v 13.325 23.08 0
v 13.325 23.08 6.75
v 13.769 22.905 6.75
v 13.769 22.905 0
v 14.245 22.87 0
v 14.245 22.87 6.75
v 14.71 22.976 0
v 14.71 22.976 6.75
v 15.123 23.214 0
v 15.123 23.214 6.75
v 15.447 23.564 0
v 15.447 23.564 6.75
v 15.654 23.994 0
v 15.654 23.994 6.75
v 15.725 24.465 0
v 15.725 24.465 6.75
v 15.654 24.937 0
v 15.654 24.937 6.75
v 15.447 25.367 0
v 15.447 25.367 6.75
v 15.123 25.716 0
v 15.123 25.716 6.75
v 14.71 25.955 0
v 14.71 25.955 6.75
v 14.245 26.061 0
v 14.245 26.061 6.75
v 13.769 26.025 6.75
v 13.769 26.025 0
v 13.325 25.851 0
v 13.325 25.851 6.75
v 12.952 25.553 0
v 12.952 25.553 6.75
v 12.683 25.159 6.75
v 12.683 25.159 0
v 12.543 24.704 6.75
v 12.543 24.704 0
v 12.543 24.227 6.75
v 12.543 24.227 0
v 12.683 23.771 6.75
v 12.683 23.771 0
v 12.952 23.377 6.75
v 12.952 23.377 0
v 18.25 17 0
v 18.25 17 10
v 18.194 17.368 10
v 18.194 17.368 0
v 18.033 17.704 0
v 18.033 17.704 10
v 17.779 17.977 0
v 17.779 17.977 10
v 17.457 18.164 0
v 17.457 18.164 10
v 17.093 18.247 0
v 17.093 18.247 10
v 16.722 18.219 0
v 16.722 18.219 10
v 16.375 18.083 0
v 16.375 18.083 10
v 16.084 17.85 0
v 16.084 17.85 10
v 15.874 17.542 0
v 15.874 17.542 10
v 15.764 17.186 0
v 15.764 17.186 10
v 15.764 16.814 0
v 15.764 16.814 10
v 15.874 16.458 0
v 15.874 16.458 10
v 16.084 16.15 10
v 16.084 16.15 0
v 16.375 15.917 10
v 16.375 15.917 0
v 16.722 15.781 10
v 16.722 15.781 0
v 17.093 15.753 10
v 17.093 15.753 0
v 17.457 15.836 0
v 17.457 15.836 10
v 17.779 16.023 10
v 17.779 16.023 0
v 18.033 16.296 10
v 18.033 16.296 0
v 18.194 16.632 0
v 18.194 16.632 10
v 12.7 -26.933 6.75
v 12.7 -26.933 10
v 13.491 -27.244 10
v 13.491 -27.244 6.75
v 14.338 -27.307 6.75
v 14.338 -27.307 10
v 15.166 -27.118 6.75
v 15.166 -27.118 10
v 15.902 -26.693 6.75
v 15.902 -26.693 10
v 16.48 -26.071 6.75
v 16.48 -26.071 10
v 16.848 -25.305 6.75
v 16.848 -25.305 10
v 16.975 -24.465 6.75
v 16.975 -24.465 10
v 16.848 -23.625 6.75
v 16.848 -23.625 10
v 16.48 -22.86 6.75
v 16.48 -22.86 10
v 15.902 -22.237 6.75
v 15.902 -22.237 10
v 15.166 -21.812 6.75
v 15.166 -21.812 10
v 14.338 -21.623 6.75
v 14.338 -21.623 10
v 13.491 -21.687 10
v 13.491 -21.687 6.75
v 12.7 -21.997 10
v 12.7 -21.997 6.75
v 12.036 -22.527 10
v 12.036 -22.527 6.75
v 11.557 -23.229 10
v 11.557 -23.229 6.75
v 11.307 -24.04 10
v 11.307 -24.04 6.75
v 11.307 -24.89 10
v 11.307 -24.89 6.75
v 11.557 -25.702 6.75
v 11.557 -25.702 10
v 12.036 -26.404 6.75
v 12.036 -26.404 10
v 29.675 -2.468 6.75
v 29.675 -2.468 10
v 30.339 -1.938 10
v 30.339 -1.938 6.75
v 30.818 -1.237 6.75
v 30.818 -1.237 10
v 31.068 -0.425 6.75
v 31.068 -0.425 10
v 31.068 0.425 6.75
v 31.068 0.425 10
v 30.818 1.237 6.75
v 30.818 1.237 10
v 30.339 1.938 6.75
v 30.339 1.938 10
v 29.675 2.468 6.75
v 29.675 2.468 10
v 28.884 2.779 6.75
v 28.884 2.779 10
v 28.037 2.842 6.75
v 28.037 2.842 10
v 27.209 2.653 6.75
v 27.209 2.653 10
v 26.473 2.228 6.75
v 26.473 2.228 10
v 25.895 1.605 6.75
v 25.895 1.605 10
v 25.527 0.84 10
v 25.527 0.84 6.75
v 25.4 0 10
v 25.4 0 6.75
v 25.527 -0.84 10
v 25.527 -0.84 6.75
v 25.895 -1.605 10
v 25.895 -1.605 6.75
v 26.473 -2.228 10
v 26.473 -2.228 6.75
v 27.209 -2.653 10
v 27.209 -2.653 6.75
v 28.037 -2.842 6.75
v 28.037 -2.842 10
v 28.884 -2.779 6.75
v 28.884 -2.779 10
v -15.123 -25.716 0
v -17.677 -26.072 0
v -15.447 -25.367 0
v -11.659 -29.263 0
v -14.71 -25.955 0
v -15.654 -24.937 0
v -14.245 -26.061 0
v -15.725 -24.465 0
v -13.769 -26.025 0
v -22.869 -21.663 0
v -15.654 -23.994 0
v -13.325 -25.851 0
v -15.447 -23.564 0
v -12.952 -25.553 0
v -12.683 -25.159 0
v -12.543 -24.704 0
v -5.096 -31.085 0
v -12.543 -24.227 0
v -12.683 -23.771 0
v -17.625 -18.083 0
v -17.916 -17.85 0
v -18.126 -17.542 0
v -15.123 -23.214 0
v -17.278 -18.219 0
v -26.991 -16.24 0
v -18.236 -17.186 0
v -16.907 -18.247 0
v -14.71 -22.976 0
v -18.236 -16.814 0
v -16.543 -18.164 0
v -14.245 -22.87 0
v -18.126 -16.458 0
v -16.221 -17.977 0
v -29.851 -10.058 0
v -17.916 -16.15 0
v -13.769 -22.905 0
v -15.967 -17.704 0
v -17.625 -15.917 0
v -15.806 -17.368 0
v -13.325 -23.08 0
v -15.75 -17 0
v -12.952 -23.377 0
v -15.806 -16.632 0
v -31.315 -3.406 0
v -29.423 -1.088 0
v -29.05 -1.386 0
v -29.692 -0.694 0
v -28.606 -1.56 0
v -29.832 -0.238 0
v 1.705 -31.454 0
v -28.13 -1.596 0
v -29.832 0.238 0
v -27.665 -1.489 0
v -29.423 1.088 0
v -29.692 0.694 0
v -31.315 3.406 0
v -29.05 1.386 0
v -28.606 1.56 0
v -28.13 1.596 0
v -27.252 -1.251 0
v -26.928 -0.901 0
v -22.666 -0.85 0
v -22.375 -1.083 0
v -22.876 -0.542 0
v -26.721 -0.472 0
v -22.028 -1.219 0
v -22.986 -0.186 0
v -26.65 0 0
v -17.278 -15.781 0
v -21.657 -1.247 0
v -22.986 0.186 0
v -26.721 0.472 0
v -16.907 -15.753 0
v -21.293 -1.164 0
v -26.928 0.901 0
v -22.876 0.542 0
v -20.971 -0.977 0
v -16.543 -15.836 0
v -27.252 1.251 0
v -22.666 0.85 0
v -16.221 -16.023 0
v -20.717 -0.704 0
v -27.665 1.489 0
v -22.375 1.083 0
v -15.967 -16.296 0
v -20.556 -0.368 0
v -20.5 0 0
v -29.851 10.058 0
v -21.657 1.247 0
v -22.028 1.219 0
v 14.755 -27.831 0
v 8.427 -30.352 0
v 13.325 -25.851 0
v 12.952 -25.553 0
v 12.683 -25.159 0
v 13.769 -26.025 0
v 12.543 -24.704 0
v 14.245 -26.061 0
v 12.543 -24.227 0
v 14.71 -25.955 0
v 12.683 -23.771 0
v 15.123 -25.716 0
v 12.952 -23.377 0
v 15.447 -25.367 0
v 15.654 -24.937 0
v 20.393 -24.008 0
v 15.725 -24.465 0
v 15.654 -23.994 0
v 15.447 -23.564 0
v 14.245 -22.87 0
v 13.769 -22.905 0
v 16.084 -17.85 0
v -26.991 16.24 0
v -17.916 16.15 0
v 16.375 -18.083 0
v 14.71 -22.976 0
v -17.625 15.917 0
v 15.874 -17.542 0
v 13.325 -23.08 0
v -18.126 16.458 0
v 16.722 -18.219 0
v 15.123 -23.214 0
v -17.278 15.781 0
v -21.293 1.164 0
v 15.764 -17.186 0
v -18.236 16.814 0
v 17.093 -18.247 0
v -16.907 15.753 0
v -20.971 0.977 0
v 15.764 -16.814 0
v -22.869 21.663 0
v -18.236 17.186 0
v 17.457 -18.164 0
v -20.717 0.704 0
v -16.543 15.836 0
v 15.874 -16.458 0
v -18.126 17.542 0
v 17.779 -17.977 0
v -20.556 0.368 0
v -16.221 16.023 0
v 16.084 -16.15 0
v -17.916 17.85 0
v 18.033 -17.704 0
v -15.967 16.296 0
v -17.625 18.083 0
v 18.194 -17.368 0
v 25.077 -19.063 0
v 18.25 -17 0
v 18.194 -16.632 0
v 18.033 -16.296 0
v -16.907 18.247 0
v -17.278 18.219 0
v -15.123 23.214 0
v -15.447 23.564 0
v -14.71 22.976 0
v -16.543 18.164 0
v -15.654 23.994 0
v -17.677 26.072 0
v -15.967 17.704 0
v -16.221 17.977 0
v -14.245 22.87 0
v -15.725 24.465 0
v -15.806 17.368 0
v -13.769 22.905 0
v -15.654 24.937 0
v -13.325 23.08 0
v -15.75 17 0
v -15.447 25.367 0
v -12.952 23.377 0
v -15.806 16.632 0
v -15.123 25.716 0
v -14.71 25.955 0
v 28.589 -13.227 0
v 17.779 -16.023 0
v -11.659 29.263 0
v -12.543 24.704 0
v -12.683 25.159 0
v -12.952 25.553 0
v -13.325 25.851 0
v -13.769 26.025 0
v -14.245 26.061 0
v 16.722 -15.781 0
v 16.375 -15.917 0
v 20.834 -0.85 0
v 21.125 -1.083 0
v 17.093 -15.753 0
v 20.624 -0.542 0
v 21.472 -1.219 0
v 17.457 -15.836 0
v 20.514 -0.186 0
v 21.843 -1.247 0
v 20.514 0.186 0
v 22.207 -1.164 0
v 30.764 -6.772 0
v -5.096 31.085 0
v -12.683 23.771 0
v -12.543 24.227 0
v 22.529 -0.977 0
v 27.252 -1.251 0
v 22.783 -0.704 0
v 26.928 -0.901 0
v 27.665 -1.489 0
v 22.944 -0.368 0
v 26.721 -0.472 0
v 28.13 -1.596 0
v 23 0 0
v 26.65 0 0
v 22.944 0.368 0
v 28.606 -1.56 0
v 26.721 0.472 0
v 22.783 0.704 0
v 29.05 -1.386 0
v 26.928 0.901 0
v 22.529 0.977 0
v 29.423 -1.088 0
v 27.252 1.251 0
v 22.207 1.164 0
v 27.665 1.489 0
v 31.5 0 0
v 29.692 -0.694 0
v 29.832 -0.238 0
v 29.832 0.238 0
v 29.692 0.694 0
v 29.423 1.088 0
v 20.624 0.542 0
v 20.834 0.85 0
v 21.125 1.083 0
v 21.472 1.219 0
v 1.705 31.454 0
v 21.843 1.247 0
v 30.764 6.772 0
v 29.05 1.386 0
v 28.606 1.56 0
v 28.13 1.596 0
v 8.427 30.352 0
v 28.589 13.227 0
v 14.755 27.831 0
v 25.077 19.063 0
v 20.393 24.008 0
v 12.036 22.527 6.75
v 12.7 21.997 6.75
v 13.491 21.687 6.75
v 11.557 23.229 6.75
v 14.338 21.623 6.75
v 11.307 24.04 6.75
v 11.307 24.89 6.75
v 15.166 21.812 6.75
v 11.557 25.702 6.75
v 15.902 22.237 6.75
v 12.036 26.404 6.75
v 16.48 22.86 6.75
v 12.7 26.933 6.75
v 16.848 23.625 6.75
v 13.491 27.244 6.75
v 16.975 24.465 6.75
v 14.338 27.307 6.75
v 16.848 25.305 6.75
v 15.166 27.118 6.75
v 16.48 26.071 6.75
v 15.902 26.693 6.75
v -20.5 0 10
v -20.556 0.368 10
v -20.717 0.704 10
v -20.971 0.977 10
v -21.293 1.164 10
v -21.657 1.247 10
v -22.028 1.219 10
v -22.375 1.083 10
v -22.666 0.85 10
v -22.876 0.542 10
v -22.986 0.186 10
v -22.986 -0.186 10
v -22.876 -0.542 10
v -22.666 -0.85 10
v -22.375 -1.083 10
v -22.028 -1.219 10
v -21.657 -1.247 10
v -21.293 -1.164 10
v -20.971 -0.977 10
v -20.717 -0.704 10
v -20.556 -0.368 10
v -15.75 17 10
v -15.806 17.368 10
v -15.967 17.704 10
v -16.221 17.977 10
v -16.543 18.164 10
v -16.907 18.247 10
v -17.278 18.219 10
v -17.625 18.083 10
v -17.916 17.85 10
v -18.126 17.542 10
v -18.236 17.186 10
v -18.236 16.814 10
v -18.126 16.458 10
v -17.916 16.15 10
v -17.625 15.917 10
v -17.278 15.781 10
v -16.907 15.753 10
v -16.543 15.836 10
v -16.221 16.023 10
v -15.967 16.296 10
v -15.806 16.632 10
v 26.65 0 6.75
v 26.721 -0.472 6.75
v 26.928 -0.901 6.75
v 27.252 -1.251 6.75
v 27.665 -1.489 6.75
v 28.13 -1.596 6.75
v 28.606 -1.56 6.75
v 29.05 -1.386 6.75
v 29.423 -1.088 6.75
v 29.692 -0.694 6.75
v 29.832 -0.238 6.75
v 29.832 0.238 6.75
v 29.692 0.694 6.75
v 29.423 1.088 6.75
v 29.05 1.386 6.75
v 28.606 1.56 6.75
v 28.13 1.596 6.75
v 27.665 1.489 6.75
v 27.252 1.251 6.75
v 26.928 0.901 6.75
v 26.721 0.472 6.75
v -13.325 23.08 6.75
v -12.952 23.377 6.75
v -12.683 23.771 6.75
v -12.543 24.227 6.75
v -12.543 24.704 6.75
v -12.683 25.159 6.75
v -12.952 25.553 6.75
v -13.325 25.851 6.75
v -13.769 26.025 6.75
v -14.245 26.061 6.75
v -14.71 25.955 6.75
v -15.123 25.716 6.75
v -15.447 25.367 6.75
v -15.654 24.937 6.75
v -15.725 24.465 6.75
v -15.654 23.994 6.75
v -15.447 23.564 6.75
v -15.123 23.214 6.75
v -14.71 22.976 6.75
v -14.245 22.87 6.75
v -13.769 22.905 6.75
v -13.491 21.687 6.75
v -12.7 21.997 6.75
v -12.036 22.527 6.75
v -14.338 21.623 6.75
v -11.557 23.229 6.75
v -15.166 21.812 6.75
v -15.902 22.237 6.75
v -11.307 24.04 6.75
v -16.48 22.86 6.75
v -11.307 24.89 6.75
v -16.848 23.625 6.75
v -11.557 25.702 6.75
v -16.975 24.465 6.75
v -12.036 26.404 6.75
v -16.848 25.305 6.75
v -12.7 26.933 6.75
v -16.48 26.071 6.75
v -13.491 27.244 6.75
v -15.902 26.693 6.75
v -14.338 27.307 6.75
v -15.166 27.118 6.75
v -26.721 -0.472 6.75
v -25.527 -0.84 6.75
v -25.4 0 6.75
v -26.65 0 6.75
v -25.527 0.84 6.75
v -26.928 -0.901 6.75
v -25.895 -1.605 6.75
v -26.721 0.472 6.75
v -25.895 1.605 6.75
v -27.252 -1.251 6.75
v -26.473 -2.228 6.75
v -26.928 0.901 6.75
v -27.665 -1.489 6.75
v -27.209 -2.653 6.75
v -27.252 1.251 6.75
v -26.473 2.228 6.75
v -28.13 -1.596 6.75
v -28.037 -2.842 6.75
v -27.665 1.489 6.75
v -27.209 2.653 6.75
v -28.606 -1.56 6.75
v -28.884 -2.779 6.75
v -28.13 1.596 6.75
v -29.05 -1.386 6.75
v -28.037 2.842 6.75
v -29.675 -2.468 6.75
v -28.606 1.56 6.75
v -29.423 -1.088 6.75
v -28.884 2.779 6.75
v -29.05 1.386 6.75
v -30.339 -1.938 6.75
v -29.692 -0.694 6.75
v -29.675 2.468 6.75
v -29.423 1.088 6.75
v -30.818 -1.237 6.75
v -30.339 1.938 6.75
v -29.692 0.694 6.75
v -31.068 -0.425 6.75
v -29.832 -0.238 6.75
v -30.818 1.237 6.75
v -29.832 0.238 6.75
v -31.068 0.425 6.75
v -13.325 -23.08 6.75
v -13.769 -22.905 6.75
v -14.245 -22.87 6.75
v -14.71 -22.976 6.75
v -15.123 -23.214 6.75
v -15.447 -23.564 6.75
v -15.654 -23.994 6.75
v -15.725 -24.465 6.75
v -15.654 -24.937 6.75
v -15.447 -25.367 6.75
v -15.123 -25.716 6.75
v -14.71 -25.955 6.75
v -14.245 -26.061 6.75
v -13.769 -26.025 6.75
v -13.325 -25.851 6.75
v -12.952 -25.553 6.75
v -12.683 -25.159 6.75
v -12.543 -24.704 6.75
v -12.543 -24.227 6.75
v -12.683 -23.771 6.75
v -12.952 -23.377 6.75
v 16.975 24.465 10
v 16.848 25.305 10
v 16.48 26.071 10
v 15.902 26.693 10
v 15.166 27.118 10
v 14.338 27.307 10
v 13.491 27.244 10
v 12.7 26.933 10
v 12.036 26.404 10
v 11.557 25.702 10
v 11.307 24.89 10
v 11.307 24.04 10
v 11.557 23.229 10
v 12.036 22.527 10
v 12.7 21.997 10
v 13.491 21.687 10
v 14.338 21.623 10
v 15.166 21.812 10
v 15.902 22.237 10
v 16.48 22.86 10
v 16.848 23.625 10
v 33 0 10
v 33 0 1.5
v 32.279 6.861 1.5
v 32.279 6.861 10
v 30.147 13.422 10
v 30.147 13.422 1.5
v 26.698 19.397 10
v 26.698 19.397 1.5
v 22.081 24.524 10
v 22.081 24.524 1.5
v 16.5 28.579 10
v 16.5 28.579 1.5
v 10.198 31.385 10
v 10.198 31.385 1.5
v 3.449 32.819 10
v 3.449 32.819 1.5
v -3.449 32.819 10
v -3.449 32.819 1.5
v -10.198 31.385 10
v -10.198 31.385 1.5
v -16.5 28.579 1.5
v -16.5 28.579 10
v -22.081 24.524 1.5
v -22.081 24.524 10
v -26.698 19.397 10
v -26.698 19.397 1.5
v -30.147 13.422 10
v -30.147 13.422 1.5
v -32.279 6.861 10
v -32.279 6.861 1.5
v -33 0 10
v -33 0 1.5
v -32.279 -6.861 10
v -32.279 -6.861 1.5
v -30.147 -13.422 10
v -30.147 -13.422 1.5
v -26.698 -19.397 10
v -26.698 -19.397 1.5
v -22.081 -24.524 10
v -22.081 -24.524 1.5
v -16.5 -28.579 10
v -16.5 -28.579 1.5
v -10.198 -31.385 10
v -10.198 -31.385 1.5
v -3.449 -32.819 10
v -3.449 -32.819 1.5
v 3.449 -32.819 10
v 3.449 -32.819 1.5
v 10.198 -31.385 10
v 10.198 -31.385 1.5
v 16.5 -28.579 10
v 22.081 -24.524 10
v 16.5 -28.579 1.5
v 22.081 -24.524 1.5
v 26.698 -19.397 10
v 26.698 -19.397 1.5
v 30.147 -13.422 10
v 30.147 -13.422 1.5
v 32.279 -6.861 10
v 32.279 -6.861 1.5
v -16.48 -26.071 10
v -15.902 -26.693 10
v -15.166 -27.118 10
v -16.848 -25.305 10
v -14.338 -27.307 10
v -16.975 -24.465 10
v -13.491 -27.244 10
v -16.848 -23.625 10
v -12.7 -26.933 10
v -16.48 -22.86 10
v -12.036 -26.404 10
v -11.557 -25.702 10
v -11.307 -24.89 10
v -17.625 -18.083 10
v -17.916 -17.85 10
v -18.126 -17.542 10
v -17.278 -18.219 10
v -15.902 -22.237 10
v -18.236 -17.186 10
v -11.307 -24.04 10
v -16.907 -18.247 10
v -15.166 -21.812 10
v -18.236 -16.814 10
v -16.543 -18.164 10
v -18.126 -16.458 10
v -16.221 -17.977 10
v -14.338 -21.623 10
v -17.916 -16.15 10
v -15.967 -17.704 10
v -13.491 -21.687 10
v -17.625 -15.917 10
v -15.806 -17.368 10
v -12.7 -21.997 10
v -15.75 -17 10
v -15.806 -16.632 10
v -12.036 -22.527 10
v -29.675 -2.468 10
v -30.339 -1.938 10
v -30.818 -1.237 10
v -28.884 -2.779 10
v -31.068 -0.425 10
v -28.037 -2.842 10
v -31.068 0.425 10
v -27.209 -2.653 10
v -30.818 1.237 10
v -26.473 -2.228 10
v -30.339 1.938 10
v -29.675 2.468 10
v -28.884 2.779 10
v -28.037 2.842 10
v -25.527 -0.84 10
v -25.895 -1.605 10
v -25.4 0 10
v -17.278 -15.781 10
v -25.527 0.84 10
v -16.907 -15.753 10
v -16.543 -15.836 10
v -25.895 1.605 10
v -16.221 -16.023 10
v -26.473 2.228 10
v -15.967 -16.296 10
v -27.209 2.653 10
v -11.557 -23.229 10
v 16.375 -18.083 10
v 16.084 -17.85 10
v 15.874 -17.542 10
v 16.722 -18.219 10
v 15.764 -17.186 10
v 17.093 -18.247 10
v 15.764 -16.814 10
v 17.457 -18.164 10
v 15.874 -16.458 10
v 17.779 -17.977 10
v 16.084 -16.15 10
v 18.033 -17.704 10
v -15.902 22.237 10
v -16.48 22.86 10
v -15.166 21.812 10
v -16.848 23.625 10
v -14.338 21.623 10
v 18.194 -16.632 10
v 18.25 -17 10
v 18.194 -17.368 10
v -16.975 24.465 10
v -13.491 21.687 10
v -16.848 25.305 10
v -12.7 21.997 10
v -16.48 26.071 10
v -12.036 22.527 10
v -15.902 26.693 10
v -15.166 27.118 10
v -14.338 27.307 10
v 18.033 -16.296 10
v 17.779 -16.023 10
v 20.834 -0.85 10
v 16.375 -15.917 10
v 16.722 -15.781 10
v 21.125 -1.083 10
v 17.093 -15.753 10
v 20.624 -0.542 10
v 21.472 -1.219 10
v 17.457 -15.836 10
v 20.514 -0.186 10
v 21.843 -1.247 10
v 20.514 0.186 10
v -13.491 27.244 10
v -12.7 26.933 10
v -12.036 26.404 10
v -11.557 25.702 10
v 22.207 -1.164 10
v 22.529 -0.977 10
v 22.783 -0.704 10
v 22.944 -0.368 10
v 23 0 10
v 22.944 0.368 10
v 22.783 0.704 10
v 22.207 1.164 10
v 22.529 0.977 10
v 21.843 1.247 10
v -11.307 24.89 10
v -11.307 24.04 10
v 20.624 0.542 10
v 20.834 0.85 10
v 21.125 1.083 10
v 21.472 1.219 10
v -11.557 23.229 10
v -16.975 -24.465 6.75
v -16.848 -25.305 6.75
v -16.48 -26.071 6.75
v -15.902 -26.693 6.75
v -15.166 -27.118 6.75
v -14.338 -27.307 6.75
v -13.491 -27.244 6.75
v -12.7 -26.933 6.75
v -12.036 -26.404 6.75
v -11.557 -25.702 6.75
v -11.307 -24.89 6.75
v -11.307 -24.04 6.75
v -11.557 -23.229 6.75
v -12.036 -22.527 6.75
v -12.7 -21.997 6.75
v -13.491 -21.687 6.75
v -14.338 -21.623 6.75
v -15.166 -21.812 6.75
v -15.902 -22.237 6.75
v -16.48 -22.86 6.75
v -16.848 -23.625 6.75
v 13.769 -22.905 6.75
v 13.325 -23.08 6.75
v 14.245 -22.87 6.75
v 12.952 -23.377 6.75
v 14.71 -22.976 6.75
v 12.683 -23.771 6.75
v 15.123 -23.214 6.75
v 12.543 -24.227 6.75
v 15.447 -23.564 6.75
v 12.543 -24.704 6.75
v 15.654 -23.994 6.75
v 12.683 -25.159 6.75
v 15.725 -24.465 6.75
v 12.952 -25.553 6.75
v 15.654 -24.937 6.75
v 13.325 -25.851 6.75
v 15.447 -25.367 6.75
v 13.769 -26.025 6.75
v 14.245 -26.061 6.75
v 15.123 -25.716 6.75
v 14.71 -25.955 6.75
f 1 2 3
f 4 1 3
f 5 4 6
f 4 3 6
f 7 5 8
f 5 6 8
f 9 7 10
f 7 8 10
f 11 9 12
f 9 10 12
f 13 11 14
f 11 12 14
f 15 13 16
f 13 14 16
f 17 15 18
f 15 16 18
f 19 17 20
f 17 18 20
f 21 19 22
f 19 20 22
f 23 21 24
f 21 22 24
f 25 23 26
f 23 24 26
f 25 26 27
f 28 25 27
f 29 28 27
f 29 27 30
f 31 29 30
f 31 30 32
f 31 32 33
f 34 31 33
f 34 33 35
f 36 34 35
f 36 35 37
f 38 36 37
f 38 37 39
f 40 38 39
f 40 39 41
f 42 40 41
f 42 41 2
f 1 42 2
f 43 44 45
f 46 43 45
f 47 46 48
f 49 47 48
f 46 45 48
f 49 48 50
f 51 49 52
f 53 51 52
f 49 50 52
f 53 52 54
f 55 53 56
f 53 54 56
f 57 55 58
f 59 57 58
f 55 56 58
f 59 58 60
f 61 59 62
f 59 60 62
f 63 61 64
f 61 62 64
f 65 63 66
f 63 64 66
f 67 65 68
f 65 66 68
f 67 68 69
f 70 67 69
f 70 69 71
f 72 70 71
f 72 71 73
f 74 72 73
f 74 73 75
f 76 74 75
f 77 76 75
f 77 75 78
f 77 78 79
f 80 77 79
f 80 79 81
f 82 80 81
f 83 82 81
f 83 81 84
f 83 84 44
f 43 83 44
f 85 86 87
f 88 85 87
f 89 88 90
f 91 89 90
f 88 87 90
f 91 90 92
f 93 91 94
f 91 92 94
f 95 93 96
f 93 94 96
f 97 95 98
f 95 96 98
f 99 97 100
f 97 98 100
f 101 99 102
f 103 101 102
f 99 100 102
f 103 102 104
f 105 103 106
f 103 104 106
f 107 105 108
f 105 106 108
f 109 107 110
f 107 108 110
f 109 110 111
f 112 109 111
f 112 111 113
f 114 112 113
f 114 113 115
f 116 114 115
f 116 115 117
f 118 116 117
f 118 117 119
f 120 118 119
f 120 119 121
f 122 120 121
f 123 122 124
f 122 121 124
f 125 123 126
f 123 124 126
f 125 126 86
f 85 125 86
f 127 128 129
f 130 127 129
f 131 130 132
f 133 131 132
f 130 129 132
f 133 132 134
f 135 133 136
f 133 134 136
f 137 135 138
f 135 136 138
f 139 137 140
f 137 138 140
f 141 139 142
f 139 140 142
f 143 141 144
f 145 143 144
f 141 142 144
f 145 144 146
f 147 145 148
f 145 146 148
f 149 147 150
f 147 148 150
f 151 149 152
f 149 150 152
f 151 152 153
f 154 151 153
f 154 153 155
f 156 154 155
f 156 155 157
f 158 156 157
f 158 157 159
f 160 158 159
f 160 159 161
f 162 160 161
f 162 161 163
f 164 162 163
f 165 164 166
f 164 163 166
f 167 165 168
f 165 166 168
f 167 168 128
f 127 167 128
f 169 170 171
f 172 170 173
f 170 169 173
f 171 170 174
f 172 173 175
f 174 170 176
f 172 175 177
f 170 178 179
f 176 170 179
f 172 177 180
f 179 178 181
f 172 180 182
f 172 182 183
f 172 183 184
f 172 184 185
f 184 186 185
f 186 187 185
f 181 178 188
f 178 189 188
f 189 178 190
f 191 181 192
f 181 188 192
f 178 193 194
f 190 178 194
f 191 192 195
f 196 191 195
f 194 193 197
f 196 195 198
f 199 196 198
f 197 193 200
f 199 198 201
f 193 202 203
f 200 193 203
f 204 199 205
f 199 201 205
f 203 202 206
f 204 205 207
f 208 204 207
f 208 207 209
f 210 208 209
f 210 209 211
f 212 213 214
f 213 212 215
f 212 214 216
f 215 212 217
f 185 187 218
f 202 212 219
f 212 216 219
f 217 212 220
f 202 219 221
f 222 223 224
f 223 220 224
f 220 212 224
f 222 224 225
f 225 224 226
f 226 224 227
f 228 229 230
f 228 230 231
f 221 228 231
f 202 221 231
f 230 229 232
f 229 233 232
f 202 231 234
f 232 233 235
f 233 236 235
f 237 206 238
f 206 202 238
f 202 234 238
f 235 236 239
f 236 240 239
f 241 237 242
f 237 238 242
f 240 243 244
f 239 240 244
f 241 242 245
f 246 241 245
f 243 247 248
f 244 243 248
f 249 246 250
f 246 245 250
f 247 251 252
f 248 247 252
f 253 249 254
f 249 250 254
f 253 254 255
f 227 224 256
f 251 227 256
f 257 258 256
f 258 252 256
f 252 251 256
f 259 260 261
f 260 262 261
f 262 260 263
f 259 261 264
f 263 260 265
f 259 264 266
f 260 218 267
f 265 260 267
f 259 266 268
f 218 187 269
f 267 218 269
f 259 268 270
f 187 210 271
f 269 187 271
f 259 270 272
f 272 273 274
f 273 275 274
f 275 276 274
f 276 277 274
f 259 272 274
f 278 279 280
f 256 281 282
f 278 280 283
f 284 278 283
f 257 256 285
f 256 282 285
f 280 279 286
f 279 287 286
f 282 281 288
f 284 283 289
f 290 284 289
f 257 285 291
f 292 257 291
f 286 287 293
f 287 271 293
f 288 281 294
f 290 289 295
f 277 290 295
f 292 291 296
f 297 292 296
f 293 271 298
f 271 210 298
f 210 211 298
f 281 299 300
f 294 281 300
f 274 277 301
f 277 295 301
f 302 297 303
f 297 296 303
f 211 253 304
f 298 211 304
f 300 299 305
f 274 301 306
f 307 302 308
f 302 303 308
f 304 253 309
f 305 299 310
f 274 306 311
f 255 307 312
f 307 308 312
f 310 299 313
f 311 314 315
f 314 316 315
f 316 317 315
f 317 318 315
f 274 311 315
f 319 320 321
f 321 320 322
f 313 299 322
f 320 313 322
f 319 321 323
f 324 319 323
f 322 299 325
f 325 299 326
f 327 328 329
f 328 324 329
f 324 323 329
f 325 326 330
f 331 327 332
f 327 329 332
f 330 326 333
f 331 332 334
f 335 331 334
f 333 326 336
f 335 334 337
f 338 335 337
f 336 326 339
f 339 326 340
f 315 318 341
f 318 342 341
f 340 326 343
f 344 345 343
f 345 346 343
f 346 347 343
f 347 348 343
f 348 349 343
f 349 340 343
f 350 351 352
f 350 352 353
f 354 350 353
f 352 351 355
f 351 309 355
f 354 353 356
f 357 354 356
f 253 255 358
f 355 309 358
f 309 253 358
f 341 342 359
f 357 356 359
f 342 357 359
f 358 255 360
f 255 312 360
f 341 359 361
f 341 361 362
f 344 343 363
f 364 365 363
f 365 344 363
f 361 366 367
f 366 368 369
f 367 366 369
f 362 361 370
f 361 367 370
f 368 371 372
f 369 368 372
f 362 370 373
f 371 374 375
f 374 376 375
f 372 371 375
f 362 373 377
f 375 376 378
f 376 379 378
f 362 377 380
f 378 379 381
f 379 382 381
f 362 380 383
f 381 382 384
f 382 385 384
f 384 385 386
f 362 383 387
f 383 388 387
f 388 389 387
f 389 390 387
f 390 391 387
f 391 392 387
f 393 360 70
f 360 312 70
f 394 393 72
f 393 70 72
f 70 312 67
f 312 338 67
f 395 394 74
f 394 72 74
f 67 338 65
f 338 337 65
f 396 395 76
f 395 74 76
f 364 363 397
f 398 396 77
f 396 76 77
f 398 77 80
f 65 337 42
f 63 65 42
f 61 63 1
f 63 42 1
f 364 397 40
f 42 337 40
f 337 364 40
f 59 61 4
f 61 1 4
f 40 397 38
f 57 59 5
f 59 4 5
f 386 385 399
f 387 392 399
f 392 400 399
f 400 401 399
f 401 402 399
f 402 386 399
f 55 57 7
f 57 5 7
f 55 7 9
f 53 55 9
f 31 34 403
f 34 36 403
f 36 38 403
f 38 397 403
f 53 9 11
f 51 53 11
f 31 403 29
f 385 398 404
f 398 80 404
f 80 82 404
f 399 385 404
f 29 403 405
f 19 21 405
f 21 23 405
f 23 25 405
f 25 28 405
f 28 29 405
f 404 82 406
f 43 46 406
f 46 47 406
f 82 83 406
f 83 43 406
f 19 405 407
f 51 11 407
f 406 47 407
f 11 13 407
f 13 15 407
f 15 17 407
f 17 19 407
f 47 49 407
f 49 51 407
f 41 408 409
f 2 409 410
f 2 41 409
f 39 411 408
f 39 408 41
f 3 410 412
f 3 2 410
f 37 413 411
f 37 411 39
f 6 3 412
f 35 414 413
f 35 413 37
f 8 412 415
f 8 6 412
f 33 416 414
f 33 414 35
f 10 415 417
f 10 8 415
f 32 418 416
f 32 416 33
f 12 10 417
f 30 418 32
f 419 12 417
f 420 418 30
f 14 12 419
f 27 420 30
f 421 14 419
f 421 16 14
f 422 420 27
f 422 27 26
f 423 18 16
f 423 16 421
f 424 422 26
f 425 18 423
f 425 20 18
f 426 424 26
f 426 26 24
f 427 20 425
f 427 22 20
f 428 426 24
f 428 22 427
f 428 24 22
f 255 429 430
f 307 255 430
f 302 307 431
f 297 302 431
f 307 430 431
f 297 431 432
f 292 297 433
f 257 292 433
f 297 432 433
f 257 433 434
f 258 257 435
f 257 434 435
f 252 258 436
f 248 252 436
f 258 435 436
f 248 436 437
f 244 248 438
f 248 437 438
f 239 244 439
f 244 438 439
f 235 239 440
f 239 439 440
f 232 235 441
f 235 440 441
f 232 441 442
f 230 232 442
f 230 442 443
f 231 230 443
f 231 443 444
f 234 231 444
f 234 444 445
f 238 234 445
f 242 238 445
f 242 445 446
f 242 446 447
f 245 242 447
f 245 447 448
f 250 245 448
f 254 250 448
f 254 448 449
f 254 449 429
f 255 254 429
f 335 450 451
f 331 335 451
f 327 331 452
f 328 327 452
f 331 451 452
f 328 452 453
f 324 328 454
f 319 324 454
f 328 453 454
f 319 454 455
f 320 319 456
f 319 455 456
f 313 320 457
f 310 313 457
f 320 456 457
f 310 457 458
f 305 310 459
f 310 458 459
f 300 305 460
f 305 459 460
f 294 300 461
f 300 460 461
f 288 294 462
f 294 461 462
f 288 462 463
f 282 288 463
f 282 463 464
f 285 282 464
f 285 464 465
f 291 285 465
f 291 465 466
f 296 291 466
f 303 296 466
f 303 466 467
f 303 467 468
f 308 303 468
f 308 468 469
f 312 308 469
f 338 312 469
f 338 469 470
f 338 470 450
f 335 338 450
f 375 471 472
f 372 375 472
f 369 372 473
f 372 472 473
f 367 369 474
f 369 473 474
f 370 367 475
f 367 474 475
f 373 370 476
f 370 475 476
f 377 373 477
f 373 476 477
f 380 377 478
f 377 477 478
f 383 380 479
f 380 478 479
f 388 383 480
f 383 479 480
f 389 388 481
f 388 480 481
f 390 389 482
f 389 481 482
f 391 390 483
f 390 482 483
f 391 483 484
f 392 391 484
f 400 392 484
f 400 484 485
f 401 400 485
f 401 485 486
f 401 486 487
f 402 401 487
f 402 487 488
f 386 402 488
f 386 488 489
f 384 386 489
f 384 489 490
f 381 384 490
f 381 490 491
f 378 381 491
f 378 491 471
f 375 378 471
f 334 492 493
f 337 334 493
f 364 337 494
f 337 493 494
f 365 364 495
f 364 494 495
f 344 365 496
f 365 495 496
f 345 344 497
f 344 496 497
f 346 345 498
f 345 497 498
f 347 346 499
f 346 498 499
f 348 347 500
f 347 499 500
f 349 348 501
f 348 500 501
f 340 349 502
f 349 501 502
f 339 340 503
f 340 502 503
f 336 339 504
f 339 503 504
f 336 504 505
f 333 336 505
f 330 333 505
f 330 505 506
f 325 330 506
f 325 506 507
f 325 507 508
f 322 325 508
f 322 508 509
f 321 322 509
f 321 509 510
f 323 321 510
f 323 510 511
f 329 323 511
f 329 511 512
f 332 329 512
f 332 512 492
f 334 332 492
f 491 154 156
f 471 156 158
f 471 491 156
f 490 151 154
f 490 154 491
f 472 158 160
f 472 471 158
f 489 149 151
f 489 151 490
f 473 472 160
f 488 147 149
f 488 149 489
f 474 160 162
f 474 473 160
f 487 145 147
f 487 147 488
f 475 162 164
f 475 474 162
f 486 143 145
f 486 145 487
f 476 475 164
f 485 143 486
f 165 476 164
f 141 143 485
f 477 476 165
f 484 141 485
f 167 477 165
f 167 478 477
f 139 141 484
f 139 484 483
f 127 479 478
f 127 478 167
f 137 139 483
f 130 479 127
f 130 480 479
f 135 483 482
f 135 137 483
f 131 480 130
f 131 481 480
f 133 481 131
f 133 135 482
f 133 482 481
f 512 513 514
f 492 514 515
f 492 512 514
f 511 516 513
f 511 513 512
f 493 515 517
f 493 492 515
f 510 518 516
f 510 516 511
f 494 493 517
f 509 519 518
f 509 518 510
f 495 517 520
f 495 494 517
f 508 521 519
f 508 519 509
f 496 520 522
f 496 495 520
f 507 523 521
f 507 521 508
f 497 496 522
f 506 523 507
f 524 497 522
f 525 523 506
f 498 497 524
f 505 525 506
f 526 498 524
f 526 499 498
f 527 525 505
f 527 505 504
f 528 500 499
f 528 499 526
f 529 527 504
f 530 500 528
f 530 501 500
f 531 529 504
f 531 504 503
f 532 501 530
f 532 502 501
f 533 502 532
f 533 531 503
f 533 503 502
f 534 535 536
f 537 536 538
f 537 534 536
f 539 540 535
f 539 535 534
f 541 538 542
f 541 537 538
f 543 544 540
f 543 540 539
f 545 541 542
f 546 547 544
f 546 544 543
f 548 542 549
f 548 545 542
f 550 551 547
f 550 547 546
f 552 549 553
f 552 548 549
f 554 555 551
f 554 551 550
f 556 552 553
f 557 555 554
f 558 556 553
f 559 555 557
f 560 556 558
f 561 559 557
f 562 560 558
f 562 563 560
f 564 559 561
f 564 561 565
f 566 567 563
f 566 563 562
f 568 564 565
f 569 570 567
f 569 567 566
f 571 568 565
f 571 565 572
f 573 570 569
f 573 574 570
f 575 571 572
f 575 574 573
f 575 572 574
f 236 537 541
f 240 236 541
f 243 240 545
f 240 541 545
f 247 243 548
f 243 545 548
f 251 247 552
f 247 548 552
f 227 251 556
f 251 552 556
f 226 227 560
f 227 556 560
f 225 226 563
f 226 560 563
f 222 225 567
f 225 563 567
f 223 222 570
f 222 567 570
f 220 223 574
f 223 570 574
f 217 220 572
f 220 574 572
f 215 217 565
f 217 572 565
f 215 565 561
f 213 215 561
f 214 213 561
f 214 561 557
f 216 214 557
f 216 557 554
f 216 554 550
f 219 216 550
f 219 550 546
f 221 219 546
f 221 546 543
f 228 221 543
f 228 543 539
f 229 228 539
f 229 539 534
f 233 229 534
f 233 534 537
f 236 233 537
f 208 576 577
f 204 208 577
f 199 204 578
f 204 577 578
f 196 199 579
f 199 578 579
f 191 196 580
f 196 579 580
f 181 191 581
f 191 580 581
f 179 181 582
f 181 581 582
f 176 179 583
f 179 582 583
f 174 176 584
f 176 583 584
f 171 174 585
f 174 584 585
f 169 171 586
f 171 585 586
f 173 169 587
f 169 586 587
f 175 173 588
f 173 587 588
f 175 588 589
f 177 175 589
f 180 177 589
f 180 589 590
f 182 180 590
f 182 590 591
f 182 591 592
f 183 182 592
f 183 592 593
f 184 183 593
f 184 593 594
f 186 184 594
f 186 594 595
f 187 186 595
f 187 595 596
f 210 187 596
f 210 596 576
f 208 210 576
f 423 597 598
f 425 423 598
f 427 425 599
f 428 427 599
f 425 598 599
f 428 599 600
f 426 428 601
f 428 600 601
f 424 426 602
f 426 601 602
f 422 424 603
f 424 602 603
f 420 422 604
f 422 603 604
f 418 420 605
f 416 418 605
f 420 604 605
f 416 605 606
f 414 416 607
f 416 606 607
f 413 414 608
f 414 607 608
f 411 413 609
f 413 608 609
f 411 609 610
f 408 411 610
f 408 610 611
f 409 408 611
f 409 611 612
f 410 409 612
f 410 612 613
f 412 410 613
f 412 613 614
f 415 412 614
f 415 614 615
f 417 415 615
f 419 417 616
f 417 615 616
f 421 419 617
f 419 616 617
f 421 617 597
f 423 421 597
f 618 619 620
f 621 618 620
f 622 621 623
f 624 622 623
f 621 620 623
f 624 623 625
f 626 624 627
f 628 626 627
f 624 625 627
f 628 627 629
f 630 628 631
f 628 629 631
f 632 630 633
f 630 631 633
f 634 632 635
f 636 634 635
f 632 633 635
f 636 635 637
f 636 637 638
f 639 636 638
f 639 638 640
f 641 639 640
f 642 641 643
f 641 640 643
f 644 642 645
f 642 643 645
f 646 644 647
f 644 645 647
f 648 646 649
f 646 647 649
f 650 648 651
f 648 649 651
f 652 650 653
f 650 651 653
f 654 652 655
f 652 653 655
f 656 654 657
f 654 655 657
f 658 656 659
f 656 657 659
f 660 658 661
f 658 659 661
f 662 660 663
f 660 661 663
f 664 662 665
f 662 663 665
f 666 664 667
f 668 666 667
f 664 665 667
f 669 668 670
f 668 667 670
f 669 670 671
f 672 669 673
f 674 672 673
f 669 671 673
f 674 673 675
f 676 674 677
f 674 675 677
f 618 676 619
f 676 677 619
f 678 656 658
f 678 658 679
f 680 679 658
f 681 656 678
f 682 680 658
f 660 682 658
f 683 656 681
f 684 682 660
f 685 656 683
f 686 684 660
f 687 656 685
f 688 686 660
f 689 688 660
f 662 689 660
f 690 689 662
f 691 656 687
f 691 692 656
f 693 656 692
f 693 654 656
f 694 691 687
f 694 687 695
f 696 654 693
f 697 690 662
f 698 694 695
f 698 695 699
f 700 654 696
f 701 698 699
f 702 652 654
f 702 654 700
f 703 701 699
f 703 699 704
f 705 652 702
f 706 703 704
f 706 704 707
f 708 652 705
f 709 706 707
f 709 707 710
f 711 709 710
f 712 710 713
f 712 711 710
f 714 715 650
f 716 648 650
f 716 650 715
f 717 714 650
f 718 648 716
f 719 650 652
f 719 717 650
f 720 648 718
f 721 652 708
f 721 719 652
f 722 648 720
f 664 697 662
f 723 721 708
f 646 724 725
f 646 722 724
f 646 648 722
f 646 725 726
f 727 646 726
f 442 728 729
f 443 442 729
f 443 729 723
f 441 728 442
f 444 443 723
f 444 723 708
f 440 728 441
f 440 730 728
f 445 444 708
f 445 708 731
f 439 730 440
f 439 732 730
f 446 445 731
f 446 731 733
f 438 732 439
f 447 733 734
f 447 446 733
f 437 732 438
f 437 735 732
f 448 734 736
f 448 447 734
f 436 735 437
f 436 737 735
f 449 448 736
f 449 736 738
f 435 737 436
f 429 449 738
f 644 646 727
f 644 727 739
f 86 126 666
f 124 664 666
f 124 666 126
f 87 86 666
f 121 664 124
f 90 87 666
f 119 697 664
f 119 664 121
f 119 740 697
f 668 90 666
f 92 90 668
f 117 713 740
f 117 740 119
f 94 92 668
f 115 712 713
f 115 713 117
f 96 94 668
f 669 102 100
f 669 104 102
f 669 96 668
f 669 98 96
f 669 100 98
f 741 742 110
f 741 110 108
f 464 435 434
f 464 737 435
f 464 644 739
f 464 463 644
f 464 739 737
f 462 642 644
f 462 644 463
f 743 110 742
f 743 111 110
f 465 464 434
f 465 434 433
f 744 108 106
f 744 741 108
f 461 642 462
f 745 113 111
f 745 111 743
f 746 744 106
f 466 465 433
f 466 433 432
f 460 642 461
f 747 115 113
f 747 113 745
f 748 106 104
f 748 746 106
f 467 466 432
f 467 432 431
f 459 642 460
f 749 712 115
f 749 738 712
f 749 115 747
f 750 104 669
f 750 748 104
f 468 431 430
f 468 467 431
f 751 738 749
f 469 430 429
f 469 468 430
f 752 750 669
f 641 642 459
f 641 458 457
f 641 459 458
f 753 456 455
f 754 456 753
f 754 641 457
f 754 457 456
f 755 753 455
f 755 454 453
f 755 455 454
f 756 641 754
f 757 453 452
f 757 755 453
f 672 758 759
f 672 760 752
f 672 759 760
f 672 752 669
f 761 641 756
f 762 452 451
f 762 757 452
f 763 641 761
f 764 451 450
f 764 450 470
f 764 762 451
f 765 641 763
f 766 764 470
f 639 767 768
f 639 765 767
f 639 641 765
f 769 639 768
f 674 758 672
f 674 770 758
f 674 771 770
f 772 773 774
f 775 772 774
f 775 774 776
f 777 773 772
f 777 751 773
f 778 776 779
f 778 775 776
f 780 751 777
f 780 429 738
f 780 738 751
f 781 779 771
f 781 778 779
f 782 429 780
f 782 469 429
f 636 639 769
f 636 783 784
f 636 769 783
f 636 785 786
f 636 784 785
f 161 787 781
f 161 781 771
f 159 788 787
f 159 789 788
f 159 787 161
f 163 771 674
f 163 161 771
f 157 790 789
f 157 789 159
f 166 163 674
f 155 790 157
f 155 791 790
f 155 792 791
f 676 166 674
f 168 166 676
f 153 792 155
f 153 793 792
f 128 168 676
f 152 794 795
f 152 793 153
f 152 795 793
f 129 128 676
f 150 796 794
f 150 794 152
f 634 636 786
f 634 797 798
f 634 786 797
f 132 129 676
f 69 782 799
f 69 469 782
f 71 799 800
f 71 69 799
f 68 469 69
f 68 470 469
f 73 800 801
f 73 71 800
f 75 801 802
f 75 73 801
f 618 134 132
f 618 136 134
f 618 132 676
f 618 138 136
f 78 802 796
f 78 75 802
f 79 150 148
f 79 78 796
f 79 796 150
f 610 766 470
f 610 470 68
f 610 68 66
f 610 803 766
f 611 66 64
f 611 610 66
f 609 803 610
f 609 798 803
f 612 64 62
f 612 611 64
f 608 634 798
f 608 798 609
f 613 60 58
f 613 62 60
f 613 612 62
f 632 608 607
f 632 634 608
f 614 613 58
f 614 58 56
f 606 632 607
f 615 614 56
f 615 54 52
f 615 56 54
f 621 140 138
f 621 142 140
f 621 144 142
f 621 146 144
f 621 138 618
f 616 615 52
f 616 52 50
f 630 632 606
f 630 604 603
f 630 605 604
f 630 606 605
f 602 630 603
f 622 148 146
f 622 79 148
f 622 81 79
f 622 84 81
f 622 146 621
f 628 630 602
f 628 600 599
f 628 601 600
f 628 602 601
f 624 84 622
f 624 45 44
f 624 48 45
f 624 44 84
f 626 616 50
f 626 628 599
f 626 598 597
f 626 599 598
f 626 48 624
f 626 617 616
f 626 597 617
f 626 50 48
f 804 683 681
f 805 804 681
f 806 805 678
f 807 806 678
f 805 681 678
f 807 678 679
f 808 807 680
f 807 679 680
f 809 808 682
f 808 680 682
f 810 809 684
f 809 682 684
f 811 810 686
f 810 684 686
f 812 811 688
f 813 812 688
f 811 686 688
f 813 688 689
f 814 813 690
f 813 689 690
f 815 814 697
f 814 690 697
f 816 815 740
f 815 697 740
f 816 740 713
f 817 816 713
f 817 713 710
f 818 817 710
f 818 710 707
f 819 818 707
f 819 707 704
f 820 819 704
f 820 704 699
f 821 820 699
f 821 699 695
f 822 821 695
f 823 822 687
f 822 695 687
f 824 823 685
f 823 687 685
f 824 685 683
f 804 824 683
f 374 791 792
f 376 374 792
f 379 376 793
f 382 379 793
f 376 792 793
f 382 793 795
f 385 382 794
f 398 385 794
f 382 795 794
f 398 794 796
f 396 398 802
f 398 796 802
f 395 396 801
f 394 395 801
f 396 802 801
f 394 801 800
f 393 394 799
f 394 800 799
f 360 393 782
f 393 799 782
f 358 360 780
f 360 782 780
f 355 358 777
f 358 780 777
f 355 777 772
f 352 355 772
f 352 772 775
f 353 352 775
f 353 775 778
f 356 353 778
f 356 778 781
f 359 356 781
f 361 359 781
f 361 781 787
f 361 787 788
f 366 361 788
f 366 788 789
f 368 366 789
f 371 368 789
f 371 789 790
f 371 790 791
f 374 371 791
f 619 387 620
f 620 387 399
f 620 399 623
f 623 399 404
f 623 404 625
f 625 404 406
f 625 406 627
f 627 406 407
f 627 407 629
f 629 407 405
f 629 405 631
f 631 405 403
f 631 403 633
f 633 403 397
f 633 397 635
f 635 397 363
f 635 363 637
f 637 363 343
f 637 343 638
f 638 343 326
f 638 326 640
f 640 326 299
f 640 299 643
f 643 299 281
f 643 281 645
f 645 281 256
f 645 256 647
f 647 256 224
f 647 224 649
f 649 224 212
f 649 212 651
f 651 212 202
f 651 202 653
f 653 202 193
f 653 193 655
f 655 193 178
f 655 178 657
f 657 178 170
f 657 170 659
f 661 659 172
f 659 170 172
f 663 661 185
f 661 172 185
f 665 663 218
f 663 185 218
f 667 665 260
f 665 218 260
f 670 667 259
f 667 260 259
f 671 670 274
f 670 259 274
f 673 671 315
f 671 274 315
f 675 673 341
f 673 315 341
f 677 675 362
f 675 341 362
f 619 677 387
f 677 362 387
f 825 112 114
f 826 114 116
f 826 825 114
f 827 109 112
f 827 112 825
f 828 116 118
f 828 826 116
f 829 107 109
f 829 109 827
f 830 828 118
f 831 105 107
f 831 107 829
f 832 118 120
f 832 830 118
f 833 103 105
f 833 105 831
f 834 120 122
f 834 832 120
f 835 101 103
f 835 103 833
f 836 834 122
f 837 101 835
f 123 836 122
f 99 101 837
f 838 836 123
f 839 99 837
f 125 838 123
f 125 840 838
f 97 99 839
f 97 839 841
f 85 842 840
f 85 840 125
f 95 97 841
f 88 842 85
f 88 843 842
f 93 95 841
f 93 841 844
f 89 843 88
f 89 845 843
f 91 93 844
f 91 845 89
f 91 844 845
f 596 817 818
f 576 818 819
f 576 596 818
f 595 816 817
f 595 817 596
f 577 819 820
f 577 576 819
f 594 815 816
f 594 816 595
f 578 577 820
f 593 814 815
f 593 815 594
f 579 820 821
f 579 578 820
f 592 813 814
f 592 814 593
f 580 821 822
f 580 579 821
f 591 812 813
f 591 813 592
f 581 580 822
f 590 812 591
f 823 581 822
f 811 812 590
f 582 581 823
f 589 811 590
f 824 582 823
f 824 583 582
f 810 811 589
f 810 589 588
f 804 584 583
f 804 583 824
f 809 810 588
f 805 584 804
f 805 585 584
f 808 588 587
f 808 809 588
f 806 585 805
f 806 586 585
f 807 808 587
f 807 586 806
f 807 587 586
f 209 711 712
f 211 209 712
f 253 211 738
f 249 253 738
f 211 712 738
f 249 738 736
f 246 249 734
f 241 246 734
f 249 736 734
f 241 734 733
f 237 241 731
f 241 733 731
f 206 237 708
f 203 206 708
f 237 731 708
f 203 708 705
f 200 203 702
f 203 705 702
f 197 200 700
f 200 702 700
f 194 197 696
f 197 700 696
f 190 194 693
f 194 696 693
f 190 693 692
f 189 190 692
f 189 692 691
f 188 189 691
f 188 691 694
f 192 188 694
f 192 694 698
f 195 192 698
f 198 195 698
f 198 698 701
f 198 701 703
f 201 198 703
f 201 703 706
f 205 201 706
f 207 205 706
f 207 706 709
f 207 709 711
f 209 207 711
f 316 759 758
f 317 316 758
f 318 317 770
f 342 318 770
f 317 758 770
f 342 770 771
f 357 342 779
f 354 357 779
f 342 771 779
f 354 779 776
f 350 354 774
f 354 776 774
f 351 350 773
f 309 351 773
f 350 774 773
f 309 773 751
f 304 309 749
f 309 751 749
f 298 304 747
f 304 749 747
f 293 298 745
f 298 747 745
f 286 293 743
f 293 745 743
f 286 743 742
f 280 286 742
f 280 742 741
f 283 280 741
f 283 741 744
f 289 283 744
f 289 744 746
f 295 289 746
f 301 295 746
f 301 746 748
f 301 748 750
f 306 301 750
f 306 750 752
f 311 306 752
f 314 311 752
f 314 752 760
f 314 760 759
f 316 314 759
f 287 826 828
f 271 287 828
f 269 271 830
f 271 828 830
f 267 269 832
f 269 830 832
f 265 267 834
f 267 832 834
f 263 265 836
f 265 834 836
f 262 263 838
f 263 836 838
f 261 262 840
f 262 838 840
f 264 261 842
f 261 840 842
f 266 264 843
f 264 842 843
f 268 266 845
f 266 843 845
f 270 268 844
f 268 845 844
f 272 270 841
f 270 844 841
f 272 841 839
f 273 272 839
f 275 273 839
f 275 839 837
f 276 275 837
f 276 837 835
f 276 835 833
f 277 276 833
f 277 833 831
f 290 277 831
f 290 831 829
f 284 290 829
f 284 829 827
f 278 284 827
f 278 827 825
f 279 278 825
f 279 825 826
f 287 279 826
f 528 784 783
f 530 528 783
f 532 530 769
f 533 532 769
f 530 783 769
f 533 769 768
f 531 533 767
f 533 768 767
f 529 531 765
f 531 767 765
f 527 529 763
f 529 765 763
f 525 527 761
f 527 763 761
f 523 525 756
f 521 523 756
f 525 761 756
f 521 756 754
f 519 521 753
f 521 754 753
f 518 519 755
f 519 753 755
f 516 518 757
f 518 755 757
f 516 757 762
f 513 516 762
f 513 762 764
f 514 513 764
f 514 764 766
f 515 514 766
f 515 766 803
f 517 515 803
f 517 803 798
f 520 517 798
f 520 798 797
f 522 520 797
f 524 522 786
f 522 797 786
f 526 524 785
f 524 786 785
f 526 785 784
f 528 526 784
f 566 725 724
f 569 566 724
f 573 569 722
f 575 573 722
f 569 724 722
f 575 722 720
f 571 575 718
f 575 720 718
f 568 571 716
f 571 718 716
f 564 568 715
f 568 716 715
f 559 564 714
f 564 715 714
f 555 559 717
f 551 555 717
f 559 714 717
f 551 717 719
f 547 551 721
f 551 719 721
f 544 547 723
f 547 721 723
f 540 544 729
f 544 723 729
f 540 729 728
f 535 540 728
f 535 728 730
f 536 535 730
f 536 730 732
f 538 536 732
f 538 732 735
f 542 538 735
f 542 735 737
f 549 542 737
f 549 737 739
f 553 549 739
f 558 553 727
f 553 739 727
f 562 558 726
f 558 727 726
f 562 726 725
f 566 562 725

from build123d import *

# Parameters (mm, degrees)
SKETCH003_R           = 33
PAD_DEPTH             = 10
CHAMFER_SIZE          = 1.5
SKETCH_R              = 1.6
POCKET_DEPTH          = 197.745507
POLARPATTERN_COUNT    = 6
SKETCH001_R           = 2.85
POCKET001_DEPTH       = 3.25
POLARPATTERN001_COUNT = 6
SKETCH002_R           = 1.25
POCKET002_DEPTH       = 10.001
SKETCH004_R           = 1.25
POCKET003_DEPTH       = 10.001


with BuildPart() as part:
    # Sketch003 → Pad (new body)
    with BuildSketch(Plane.XY):
        Circle(SKETCH003_R)
    extrude(amount=PAD_DEPTH)

    # Chamfer
    chamfer_edges = [part.edges().sort_by_distance(p)[0] for p in [
        (-33, 0, 0),
    ]]
    chamfer(chamfer_edges, length=CHAMFER_SIZE)

    # Sketch → Pocket (cut, through all)
    with BuildSketch(Plane.XY.offset(10)):
        with Locations((-28.25, 0)):
            Circle(SKETCH_R)
    pocket = extrude(amount=-POCKET_DEPTH, mode=Mode.SUBTRACT)

    # PolarPattern: Pocket ×6 about axis
    polarpattern_axis = Axis((0, 0, 10), (0, 0, 1))
    for i in range(1, POLARPATTERN_COUNT):
        add(pocket.rotate(polarpattern_axis, i * 360 / POLARPATTERN_COUNT), mode=Mode.SUBTRACT)

    # Sketch001 → Pocket001 (cut)
    with BuildSketch(Plane.XY.offset(10)):
        with Locations((14.125, 24.465218)):
            Circle(SKETCH001_R)
    pocket001 = extrude(amount=-POCKET001_DEPTH, mode=Mode.SUBTRACT)

    # PolarPattern001: Pocket001 ×6 about axis
    polarpattern001_axis = Axis((0, 0, 10), (0, 0, 1))
    for i in range(1, POLARPATTERN001_COUNT):
        add(pocket001.rotate(polarpattern001_axis, i * 360 / POLARPATTERN001_COUNT), mode=Mode.SUBTRACT)

    # Sketch002 → Pocket002 (cut, through all)
    with BuildSketch(Plane.XY.offset(10)):
        with Locations((-17, 17)):
            Circle(SKETCH002_R)
        with Locations((17, 17)):
            Circle(SKETCH002_R)
        with Locations((-17, -17)):
            Circle(SKETCH002_R)
        with Locations((17, -17)):
            Circle(SKETCH002_R)
    extrude(amount=-POCKET002_DEPTH, mode=Mode.SUBTRACT)

    # Sketch004 → Pocket003 (cut, through all)
    with BuildSketch(Plane.XY.offset(10)):
        with Locations((-21.75, 0)):
            Circle(SKETCH004_R)
        with Locations((21.75, 0)):
            Circle(SKETCH004_R)
    extrude(amount=-POCKET003_DEPTH, mode=Mode.SUBTRACT)


solid = part.part
